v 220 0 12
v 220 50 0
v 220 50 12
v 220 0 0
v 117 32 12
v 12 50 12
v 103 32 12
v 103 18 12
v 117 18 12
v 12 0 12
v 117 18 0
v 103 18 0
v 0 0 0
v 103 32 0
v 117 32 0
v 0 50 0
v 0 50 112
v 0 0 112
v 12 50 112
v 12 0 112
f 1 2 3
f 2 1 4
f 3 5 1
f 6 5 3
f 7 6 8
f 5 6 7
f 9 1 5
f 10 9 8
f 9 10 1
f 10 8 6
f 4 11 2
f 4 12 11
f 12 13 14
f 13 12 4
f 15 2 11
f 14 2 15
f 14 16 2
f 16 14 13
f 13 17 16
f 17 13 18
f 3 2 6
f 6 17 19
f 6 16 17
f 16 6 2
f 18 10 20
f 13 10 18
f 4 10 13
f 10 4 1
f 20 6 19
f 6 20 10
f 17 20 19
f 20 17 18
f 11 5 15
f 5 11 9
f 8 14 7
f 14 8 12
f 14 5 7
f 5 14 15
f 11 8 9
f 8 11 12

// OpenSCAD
$fn = 32;

// ----------------------------------------------------------------------
// Gantry bracket: 200-250 mm L bracket
// ----------------------------------------------------------------------

// --- parameters (mm) ---
base_l = 220;             // base arm length, X
arm_w = 50;               // arm width, Y
thick = 12;               // arm thickness
up_h = 100;               // vertical arm height, Z
slot_w = 14;              // adjustment slot width in the base

total_h = up_h + thick;  // overall height

difference() {
  union() {
    cube([base_l, arm_w, thick]);
    cube([thick, arm_w, total_h]);
  }
  translate([base_l / 2 - slot_w / 2, arm_w / 2 - slot_w / 2, -1])
    cube([slot_w, slot_w, thick + 2]);
}
